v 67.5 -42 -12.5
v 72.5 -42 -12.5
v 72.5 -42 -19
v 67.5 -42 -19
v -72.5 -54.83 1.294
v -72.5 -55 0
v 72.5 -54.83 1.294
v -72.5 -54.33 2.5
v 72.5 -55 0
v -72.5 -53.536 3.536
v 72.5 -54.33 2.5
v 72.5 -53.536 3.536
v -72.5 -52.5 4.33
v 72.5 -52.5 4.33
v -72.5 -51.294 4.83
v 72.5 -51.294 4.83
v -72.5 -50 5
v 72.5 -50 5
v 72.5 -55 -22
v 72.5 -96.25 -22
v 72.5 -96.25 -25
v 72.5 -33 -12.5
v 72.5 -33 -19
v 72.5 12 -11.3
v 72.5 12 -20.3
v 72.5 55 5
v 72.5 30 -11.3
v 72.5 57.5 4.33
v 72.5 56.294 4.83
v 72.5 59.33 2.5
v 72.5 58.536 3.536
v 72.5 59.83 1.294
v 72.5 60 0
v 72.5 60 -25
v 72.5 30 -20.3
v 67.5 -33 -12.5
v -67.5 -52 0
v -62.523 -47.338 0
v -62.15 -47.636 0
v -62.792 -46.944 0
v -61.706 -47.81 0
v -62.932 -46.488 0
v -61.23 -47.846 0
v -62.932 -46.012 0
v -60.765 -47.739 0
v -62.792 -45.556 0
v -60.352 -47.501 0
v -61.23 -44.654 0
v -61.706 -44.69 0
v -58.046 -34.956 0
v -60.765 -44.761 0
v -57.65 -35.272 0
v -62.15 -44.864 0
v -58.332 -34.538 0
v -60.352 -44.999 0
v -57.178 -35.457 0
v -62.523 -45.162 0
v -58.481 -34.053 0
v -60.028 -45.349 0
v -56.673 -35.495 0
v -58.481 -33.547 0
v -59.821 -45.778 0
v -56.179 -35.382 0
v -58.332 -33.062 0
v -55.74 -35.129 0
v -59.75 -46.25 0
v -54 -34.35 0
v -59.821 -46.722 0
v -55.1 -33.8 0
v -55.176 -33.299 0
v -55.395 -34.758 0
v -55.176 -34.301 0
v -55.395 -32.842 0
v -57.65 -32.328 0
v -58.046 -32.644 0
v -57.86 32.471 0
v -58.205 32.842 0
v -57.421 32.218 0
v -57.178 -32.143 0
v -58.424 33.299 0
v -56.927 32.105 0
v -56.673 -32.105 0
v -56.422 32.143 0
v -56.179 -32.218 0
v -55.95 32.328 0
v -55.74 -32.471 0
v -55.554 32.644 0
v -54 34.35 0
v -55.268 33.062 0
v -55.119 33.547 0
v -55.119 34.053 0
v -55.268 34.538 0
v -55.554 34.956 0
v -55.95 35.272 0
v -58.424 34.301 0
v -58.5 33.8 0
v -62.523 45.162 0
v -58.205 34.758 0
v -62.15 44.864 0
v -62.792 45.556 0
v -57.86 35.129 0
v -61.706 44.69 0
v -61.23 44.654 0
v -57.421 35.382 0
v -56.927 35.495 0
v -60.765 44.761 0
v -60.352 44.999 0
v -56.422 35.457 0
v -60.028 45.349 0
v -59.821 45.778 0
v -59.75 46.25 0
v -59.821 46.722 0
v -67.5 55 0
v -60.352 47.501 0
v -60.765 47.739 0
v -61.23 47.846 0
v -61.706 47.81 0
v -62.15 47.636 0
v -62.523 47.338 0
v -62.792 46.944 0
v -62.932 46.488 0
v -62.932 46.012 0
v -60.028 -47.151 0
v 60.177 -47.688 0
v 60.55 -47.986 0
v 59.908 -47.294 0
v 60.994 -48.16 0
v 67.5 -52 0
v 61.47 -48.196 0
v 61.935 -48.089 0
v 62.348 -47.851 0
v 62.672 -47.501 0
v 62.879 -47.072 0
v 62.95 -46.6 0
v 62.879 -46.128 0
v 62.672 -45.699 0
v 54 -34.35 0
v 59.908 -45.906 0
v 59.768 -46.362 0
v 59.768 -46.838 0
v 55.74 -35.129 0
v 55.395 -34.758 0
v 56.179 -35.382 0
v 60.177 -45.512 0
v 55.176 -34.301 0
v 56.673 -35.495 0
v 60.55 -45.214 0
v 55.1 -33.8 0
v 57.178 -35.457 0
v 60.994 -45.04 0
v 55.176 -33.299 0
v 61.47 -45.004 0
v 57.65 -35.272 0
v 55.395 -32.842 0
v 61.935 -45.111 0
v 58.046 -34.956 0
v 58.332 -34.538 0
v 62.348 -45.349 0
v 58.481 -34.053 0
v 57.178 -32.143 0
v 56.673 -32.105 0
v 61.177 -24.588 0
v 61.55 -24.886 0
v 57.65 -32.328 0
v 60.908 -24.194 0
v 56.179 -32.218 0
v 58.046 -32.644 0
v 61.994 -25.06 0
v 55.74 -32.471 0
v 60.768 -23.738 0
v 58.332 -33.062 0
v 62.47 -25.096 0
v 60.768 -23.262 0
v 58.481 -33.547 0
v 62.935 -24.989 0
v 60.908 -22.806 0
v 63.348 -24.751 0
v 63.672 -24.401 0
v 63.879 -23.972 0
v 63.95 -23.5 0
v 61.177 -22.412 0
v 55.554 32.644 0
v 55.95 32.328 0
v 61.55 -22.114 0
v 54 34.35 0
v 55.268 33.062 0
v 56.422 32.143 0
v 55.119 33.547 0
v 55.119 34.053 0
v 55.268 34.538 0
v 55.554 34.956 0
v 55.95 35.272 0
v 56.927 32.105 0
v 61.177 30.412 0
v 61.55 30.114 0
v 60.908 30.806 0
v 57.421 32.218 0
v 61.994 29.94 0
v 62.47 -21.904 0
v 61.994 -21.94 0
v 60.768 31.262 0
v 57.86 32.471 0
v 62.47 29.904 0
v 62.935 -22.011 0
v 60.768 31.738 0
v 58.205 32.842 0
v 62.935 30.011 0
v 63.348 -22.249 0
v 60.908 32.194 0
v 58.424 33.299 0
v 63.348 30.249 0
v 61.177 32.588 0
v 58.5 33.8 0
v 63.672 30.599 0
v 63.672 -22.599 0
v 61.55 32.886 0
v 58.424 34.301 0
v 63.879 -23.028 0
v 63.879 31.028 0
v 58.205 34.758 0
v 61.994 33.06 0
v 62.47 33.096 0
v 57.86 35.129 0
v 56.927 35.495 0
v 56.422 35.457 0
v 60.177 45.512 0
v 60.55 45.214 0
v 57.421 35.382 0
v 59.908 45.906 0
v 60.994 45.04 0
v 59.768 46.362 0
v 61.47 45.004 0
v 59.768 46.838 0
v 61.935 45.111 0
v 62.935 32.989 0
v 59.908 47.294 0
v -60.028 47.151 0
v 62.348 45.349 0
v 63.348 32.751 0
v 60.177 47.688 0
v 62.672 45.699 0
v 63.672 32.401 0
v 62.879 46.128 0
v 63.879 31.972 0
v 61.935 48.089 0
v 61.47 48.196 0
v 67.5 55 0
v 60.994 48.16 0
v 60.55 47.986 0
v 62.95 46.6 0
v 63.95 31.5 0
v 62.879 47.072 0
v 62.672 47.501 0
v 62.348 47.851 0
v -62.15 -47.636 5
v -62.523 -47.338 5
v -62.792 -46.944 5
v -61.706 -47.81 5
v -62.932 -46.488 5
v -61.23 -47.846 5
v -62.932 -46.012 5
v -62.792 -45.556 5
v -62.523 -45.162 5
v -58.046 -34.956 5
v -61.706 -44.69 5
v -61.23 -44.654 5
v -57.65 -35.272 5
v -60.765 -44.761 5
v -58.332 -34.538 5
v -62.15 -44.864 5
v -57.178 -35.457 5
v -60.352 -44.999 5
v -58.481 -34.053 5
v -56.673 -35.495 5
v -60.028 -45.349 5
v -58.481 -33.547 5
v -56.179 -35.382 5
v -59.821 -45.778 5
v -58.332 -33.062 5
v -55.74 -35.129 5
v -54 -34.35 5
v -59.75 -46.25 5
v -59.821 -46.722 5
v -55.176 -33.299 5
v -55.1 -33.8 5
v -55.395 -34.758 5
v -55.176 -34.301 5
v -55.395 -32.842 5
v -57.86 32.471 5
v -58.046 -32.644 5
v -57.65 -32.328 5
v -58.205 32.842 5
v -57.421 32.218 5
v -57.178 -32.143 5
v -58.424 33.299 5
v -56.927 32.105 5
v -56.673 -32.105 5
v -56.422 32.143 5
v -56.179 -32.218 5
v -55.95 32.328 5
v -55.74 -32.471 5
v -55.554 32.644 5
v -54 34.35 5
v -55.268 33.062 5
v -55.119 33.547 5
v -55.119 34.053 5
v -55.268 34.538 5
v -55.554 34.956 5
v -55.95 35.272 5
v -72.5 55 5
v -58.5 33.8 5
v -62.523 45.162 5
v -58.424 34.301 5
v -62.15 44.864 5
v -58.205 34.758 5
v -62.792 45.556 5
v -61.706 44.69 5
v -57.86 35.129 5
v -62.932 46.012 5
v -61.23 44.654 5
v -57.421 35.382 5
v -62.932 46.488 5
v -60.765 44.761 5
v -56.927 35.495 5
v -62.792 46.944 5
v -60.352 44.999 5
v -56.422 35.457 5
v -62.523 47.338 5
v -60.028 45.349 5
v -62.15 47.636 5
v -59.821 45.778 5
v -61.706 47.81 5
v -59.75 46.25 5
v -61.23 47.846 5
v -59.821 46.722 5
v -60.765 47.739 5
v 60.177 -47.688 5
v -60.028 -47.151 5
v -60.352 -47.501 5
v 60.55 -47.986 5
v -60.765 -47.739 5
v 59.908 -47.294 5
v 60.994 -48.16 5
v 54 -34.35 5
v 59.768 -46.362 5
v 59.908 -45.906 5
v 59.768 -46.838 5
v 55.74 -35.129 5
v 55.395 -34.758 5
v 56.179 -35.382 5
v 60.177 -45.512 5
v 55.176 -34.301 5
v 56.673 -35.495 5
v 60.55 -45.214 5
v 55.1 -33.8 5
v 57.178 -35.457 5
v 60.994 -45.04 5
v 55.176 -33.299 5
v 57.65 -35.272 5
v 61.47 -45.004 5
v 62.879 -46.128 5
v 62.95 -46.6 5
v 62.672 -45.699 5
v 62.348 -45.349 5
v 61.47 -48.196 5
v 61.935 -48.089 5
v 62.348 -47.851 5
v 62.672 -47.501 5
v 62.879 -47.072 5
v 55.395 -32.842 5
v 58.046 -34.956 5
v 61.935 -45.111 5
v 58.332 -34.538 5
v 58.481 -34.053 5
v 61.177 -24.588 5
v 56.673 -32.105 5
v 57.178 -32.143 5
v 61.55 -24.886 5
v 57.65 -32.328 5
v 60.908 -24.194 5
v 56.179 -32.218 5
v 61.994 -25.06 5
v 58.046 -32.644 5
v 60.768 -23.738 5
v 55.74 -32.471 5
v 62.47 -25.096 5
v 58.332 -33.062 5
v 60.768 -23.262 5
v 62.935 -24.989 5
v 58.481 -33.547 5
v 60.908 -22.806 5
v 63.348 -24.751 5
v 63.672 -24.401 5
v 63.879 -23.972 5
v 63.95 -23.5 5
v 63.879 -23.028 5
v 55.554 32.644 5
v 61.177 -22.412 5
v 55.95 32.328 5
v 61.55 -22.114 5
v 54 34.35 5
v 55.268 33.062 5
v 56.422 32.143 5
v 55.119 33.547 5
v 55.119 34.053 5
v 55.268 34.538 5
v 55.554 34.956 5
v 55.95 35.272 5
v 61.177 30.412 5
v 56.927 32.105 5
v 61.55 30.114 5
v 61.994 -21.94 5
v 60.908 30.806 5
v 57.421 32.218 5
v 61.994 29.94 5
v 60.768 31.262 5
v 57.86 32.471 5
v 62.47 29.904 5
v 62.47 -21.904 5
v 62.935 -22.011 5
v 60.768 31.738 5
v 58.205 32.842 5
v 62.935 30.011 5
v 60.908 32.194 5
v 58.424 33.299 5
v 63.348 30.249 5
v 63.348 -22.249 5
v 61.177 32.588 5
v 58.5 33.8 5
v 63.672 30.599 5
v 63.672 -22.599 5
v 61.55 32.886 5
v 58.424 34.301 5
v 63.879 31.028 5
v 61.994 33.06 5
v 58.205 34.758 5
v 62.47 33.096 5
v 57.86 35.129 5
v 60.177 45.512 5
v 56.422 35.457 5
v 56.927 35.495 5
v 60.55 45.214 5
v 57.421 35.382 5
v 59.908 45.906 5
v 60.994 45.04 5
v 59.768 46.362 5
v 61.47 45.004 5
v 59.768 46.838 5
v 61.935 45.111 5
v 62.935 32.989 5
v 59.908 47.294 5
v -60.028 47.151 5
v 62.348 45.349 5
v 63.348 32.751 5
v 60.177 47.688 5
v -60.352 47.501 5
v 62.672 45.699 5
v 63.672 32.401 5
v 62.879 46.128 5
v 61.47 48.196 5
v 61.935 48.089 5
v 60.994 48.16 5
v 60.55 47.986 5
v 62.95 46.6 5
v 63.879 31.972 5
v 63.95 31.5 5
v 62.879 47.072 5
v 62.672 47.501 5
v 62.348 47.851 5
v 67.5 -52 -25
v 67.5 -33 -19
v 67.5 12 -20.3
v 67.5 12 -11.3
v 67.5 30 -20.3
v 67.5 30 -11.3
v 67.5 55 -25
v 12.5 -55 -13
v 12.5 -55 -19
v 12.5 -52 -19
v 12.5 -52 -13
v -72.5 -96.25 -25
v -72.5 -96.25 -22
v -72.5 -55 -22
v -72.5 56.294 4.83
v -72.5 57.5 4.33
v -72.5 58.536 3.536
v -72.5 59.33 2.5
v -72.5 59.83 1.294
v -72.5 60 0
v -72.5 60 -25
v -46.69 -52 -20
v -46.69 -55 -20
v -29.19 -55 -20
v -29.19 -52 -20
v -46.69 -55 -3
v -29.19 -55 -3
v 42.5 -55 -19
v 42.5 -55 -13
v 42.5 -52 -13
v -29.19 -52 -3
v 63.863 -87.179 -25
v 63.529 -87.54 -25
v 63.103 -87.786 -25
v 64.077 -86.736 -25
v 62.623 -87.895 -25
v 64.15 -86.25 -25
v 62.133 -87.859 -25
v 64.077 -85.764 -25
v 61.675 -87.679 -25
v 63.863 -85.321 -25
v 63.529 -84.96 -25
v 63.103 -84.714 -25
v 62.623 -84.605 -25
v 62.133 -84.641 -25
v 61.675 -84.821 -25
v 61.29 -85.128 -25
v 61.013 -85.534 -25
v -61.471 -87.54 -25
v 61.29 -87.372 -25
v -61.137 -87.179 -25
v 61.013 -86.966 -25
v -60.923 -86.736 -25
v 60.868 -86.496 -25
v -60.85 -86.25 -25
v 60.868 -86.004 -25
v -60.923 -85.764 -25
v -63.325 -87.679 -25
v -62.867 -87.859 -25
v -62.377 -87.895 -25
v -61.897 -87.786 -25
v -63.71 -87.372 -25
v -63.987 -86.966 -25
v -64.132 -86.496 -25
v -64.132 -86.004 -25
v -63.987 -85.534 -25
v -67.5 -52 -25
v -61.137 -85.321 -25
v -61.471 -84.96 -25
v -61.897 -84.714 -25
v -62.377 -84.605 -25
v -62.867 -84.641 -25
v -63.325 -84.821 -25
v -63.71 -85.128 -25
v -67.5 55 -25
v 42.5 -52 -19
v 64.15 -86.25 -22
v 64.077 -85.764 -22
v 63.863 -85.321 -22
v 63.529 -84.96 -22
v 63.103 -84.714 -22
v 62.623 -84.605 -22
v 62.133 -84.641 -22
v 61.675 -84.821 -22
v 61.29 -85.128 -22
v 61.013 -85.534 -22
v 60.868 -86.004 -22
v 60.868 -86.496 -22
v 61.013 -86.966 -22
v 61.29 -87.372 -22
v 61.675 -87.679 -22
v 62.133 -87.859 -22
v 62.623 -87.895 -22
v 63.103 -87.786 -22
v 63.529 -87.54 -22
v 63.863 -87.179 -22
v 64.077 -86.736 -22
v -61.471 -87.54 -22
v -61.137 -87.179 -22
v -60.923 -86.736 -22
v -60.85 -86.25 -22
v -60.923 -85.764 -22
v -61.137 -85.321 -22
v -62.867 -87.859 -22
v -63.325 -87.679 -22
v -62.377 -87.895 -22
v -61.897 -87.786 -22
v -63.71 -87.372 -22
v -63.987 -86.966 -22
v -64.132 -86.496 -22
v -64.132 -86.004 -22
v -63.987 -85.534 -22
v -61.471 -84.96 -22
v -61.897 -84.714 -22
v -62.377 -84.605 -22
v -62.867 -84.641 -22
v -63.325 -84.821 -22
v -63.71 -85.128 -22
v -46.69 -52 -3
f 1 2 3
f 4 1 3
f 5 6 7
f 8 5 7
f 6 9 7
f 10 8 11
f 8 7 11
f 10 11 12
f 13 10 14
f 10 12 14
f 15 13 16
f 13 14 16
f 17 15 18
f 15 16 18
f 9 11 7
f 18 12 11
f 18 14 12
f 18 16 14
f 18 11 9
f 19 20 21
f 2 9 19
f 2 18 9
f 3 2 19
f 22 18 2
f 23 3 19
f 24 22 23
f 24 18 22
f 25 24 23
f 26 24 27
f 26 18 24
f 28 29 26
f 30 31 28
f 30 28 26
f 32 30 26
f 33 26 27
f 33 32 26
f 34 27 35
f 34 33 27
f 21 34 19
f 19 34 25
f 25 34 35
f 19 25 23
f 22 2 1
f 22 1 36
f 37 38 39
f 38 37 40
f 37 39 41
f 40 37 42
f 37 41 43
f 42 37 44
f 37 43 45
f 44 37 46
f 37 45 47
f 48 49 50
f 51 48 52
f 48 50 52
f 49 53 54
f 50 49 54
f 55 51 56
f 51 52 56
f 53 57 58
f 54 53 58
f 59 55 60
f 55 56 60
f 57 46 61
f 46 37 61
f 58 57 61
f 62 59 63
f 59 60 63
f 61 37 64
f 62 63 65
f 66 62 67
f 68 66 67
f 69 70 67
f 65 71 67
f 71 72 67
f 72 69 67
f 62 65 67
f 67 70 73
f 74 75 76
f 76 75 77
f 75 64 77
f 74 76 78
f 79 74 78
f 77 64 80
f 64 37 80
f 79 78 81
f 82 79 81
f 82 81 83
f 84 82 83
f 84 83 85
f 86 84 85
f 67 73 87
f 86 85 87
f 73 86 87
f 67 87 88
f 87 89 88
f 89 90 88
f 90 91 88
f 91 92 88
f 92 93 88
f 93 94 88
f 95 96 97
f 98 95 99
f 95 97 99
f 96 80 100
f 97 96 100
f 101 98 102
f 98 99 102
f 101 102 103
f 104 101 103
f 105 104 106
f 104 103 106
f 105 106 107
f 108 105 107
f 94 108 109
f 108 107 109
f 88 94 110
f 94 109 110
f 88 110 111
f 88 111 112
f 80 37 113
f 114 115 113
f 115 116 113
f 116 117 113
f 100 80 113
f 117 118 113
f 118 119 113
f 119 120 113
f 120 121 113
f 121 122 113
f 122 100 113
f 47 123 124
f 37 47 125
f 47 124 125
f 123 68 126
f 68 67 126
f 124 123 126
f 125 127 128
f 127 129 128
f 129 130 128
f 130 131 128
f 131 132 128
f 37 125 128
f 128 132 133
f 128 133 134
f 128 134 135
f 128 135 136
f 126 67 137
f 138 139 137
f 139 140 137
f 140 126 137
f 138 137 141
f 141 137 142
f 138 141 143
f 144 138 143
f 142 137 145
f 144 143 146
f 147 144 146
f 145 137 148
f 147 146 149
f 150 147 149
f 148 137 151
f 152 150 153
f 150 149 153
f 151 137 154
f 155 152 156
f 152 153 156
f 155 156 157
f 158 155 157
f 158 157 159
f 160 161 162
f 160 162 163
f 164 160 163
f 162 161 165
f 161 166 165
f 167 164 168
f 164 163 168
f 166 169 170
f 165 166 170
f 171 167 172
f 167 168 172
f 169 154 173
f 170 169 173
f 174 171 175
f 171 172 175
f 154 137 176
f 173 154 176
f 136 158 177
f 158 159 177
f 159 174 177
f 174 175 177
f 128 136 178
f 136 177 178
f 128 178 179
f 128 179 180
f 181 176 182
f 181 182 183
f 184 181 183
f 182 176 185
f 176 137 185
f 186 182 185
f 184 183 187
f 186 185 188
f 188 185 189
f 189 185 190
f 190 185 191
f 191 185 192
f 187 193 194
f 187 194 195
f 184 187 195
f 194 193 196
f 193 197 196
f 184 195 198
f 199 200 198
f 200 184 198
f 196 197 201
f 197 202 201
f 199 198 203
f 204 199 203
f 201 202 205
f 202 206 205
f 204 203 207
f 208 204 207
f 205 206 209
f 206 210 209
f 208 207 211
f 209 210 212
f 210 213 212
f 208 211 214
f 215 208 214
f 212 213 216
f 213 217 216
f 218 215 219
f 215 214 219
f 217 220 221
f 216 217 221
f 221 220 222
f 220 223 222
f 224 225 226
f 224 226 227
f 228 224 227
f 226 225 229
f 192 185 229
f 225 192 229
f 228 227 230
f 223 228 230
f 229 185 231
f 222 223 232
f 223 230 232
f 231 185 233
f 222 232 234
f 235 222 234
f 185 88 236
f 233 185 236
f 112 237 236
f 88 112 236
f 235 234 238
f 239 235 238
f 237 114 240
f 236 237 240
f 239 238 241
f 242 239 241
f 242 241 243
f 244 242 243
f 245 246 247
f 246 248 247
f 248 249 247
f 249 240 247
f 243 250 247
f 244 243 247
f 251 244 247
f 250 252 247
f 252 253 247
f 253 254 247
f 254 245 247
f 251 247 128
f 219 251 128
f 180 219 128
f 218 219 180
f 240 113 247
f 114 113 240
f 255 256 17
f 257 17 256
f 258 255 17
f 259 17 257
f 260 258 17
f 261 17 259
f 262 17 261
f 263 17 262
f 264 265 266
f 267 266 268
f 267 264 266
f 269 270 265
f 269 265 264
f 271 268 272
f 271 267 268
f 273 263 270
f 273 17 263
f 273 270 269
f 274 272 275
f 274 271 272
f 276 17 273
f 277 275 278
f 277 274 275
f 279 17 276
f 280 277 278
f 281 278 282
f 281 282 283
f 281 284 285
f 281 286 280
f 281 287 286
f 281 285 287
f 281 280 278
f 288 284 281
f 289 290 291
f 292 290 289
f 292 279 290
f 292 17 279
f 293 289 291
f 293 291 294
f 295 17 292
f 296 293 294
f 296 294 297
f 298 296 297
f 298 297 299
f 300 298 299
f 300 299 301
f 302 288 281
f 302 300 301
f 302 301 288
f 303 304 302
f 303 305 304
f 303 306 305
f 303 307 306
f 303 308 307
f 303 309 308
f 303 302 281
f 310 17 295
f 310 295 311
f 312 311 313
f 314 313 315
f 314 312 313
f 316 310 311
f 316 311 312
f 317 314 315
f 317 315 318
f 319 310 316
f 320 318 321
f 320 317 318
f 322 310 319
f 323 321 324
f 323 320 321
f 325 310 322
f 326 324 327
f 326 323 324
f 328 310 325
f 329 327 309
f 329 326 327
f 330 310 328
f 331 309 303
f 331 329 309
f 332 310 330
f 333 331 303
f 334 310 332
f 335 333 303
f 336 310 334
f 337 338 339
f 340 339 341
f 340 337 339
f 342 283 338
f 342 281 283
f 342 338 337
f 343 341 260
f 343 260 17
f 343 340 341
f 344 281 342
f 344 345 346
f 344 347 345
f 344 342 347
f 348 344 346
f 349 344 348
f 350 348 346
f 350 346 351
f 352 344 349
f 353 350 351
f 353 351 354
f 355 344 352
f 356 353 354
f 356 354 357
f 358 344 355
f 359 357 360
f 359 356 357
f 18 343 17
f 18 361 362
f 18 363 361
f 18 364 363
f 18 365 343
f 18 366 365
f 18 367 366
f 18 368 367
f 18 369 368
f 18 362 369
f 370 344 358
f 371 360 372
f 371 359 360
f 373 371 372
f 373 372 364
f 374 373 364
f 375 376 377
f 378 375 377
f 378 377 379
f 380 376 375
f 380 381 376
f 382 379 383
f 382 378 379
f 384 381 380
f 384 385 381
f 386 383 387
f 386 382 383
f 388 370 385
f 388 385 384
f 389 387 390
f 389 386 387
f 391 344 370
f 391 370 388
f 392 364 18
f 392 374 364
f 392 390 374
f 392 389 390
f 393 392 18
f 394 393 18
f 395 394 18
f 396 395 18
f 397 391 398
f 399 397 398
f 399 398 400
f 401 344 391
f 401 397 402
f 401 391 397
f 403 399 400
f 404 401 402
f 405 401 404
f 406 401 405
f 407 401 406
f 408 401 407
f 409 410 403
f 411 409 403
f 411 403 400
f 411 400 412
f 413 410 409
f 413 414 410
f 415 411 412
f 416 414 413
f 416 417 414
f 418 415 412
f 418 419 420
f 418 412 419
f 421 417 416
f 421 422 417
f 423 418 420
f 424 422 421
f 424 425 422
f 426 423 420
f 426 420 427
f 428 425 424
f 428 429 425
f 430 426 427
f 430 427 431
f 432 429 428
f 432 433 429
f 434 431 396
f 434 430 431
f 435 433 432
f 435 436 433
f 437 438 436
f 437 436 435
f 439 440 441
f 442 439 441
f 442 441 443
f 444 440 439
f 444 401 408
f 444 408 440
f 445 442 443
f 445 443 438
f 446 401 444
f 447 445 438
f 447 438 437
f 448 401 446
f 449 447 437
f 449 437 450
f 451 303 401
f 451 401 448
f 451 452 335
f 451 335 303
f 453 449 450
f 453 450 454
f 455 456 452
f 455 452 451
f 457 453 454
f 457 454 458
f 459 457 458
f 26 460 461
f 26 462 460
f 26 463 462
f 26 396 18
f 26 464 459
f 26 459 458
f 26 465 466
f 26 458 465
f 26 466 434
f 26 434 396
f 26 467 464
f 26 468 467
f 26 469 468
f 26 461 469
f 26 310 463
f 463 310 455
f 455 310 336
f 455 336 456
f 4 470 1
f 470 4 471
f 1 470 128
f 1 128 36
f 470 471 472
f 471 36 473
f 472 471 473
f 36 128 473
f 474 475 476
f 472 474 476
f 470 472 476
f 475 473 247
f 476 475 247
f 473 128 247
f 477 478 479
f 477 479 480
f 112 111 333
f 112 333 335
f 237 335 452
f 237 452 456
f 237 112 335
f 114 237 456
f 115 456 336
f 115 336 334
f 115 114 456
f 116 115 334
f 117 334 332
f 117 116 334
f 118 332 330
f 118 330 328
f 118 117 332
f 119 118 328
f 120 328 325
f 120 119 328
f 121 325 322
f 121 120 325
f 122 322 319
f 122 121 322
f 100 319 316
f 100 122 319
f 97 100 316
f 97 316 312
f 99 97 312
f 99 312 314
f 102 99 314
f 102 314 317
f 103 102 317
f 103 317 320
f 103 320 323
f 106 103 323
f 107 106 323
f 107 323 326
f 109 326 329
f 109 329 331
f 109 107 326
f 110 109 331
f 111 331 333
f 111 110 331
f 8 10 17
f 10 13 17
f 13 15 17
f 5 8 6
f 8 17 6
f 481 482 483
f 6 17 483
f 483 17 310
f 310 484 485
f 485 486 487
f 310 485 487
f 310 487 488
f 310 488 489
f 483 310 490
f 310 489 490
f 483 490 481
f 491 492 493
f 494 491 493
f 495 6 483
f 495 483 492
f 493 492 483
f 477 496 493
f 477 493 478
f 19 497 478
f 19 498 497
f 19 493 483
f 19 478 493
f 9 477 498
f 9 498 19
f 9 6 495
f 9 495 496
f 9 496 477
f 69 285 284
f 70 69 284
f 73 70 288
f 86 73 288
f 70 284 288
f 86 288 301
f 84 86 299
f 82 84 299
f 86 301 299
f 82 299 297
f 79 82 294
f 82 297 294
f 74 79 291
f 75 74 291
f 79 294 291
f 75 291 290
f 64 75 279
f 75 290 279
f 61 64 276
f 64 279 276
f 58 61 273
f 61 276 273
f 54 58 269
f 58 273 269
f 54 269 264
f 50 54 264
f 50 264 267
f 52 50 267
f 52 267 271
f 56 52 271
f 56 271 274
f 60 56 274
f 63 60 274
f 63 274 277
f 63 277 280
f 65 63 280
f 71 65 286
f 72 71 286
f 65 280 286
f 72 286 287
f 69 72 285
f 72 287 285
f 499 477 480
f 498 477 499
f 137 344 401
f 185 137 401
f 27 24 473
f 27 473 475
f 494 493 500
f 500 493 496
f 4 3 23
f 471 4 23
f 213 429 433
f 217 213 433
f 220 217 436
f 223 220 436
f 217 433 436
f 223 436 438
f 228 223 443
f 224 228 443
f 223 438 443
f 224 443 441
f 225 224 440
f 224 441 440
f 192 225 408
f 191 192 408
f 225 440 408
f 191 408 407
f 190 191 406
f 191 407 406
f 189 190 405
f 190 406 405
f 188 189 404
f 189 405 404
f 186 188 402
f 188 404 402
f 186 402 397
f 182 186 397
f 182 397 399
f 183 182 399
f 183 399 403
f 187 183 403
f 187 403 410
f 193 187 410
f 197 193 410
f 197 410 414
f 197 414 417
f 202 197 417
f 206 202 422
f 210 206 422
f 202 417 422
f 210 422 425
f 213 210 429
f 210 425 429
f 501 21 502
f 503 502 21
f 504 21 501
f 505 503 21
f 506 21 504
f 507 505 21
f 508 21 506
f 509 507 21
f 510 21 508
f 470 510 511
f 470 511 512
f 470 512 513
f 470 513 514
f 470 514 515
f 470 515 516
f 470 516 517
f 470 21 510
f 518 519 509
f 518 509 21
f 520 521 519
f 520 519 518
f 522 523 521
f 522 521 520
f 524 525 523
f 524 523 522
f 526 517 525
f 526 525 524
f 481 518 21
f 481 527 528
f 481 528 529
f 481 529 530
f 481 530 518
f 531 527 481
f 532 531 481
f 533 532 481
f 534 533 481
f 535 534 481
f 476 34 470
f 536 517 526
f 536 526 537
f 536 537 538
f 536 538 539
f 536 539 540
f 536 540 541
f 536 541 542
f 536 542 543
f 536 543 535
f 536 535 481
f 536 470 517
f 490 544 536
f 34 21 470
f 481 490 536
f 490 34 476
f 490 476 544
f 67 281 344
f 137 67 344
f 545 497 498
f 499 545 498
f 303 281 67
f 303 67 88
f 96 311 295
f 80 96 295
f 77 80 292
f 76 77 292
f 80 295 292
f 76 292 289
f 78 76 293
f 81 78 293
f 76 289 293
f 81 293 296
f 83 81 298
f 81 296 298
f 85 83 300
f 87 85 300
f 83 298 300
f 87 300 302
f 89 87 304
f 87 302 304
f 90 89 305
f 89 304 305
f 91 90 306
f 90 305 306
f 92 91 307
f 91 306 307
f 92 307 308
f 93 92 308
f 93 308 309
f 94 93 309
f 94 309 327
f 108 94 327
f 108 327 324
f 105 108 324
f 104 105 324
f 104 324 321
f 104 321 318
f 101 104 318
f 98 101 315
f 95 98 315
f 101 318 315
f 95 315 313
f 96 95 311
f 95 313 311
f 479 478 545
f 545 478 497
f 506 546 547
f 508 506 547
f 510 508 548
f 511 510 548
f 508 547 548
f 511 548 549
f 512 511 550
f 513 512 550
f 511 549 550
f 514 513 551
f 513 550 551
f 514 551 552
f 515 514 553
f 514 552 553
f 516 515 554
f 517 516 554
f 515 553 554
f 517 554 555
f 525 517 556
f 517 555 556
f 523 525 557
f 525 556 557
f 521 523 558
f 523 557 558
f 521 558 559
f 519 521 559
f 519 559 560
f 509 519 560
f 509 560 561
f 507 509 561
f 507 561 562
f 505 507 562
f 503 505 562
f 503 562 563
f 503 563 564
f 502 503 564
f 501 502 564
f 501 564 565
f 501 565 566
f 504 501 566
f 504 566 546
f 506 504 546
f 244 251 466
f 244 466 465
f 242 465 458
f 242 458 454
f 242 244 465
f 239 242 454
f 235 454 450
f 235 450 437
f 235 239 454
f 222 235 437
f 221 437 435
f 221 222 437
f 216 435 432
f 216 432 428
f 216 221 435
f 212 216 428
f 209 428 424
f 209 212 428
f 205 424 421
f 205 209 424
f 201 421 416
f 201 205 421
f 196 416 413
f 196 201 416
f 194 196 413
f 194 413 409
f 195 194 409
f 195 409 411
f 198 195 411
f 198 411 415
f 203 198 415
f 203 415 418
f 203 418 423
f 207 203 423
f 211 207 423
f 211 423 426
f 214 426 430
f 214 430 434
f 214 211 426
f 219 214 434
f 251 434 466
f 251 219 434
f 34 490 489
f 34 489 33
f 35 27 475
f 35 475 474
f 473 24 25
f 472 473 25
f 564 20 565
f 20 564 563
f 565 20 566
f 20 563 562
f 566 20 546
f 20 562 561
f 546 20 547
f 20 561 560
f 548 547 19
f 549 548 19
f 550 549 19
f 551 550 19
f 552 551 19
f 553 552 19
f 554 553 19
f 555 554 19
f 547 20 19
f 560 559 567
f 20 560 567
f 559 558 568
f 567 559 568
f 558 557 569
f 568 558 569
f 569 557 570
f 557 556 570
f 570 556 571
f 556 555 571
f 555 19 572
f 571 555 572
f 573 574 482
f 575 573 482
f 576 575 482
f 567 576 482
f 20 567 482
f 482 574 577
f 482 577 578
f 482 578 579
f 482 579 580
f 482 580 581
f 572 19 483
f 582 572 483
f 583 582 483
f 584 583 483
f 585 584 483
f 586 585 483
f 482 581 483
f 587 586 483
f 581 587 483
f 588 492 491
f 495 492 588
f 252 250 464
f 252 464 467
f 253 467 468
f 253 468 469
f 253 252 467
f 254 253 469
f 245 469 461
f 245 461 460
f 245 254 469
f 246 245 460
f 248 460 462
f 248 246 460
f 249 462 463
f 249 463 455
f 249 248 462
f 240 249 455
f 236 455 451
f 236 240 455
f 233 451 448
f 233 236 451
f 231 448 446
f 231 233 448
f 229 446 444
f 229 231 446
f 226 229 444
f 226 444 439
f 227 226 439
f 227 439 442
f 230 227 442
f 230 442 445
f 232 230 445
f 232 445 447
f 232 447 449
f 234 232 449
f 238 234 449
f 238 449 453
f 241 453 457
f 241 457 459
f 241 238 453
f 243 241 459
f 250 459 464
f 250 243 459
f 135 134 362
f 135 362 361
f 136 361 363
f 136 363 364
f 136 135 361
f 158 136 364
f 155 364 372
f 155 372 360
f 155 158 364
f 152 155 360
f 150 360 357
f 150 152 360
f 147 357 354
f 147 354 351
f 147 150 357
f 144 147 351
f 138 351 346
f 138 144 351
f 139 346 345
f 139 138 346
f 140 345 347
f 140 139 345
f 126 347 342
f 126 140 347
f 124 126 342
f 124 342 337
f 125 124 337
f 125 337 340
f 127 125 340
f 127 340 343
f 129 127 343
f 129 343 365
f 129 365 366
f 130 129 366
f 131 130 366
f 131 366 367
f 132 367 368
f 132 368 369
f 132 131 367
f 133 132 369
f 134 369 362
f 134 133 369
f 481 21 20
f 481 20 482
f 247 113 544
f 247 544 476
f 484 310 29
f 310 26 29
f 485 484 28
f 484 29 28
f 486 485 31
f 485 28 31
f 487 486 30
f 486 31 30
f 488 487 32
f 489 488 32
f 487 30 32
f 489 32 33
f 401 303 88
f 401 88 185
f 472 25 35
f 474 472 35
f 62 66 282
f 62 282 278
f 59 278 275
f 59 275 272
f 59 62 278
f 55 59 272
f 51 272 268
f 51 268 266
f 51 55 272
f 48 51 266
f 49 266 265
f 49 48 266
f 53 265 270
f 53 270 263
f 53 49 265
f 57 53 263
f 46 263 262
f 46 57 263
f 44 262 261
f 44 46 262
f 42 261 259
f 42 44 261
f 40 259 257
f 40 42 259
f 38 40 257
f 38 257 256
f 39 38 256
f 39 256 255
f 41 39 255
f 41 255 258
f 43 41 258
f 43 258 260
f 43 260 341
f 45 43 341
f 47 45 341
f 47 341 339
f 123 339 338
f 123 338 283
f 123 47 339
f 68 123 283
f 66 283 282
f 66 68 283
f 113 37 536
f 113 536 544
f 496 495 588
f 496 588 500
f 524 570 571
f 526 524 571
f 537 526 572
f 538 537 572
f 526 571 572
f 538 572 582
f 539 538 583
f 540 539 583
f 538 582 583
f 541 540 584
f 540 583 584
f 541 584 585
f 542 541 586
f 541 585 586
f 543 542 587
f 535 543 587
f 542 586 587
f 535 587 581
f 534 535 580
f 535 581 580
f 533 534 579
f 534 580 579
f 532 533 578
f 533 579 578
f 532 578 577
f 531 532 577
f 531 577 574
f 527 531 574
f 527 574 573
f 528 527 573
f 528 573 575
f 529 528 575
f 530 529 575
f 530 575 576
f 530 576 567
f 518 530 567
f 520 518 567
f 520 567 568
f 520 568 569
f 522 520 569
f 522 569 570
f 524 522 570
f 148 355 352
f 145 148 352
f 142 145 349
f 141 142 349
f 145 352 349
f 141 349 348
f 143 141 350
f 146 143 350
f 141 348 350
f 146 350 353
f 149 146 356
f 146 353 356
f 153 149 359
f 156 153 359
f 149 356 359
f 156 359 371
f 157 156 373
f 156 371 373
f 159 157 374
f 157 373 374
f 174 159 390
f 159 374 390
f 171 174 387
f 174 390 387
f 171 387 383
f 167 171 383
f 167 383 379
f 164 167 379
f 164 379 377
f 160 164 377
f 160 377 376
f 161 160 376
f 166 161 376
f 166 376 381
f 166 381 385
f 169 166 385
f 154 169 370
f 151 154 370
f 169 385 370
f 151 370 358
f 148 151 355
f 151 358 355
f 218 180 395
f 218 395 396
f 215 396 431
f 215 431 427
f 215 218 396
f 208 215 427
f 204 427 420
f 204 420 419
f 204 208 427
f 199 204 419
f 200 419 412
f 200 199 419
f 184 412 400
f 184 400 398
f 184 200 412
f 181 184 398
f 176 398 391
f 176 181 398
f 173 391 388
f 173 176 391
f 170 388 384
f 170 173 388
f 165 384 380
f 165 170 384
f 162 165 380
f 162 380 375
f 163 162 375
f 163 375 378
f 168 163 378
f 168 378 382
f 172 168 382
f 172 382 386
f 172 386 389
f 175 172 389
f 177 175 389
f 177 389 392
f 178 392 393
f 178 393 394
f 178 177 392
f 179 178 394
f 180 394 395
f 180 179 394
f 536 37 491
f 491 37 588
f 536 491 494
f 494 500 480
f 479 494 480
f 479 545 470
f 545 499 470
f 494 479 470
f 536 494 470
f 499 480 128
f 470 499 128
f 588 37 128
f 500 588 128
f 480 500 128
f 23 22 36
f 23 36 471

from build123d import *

# Parameters (mm, degrees)
SKETCH_1_W           = 145
SKETCH_1_H           = 120
SKETCH_1_R           = 1.6
EXTRUDE_1_DEPTH      = 5
SKETCH_2_W           = 145
SKETCH_2_H           = 5
CUT_EXTRUDE_1_DEPTH  = 8
SKETCH_3_W           = 145
SKETCH_3_H           = 115
SKETCH_3_W_2         = 135
SKETCH_3_H_2         = 107
EXTRUDE_6_DEPTH      = 30
SKETCH_4_W           = 145
SKETCH_4_H           = 3
EXTRUDE_7_DEPTH      = 41.25
SKETCH_7_W           = 9
SKETCH_7_H           = 18
CUT_EXTRUDE_4_DEPTH  = 7
SKETCH_8_W           = 30
SKETCH_8_H           = 6
CUT_EXTRUDE_6_DEPTH  = 6
SKETCH_9_W           = 6.5
SKETCH_9_H           = 9
CUT_EXTRUDE_7_DEPTH  = 6
SKETCH_6_W           = 17.5
SKETCH_6_H           = 17
CUT_EXTRUDE_8_DEPTH  = 10
SKETCH_11_R          = 1.7
SKETCH_11_W          = 108
SKETCH_11_H          = 68.7
CUT_EXTRUDE_9_DEPTH  = 5
FILLET_1_R           = 5
FILLET_2_R           = 5
SKETCH_13_R          = 1.65
CUT_EXTRUDE_10_DEPTH = 8


with BuildPart() as part:
    # 草图1 → 凸台-拉伸1 (new body)
    with BuildSketch(Plane.XY):
        Rectangle(SKETCH_1_W, SKETCH_1_H)
        with Locations((-49.95, -23.5)):
            Circle(SKETCH_1_R, mode=Mode.SUBTRACT)
        with Locations((-49.95, 31.5)):
            Circle(SKETCH_1_R, mode=Mode.SUBTRACT)
        with Locations((-61.35, 46.25)):
            Circle(SKETCH_1_R, mode=Mode.SUBTRACT)
        with Locations((61.35, -46.6)):
            Circle(SKETCH_1_R, mode=Mode.SUBTRACT)
        with Locations((61.35, 46.6)):
            Circle(SKETCH_1_R, mode=Mode.SUBTRACT)
        with Locations((-61.35, -46.25)):
            Circle(SKETCH_1_R, mode=Mode.SUBTRACT)
        with Locations((62.35, 31.5)):
            Circle(SKETCH_1_R, mode=Mode.SUBTRACT)
        with Locations((62.35, -23.5)):
            Circle(SKETCH_1_R, mode=Mode.SUBTRACT)
    extrude(amount=EXTRUDE_1_DEPTH)

    # 草图2 → 切除-拉伸1 (cut)
    with BuildSketch(Plane.XY.offset(5)):
        with Locations((0, -57.5)):
            Rectangle(SKETCH_2_W, SKETCH_2_H)
    extrude(amount=-CUT_EXTRUDE_1_DEPTH, mode=Mode.SUBTRACT)

    # 草图3 → 凸台-拉伸6 (add)
    with BuildSketch(Plane.XY.offset(5)):
        with Locations((0, 2.5)):
            Rectangle(SKETCH_3_W, SKETCH_3_H)
        with Locations((0, 1.5)):
            Rectangle(SKETCH_3_W_2, SKETCH_3_H_2, mode=Mode.SUBTRACT)
    extrude(amount=-EXTRUDE_6_DEPTH)

    # 草图4 → 凸台-拉伸7 (add)
    with BuildSketch(Plane(origin=(0, -55, 0), x_dir=(-1, 0, 0), z_dir=(0, -1, 0))):
        with Locations((0, 23.5)):
            Rectangle(SKETCH_4_W, SKETCH_4_H)
    extrude(amount=EXTRUDE_7_DEPTH)

    # 草图7 → 切除-拉伸4 (cut)
    with BuildSketch(Plane(origin=(72.5, 0, 0), x_dir=(0, 0, -1), z_dir=(1, 0, 0))):
        with Locations((15.8, 21)):
            Rectangle(SKETCH_7_W, SKETCH_7_H)
    extrude(amount=-CUT_EXTRUDE_4_DEPTH, mode=Mode.SUBTRACT)

    # 草图8 → 切除-拉伸6 (cut)
    with BuildSketch(Plane.XZ.offset(55)):
        with Locations((27.5, -16)):
            Rectangle(SKETCH_8_W, SKETCH_8_H)
    extrude(amount=-CUT_EXTRUDE_6_DEPTH, mode=Mode.SUBTRACT)

    # 草图9 → 切除-拉伸7 (cut)
    with BuildSketch(Plane(origin=(72.5, 0, 0), x_dir=(0, 0, -1), z_dir=(1, 0, 0))):
        with Locations((15.75, -37.5)):
            Rectangle(SKETCH_9_W, SKETCH_9_H)
    extrude(amount=-CUT_EXTRUDE_7_DEPTH, mode=Mode.SUBTRACT)

    # 草图6 → 切除-拉伸8 (cut)
    with BuildSketch(Plane.XZ.offset(55)):
        with Locations((-37.94, -11.5)):
            Rectangle(SKETCH_6_W, SKETCH_6_H)
    extrude(amount=-CUT_EXTRUDE_8_DEPTH, mode=Mode.SUBTRACT)

    # 草图11 → 切除-拉伸9 (cut)
    with BuildSketch(Plane.XY.offset(5)):
        with Locations((56.8, 33.8)):
            Circle(SKETCH_11_R)
        with Locations(Location((56.8, -33.8, 0), (0, 0, 180))):
            Circle(SKETCH_11_R)
        with Locations((-56.8, -33.8)):
            Circle(SKETCH_11_R)
        with Locations(Location((-56.8, 33.8, 0), (0, 0, 180))):
            Circle(SKETCH_11_R)
        Rectangle(SKETCH_11_W, SKETCH_11_H)
    extrude(amount=-CUT_EXTRUDE_9_DEPTH, mode=Mode.SUBTRACT)

    # 圆角1
    fillet_1_edges = [part.edges().sort_by_distance(p)[0] for p in [
        (0, -55, 5),
    ]]
    fillet(fillet_1_edges, radius=FILLET_1_R)

    # 圆角2
    fillet_2_edges = [part.edges().sort_by_distance(p)[0] for p in [
        (0, 60, 5),
    ]]
    fillet(fillet_2_edges, radius=FILLET_2_R)

    # 草图13 → 切除-拉伸10 (cut)
    with BuildSketch(Plane.XY.offset(-22)):
        with Locations((-62.5, -86.25)):
            Circle(SKETCH_13_R)
        with Locations((62.5, -86.25)):
            Circle(SKETCH_13_R)
    extrude(amount=-CUT_EXTRUDE_10_DEPTH, mode=Mode.SUBTRACT)


solid = part.part
